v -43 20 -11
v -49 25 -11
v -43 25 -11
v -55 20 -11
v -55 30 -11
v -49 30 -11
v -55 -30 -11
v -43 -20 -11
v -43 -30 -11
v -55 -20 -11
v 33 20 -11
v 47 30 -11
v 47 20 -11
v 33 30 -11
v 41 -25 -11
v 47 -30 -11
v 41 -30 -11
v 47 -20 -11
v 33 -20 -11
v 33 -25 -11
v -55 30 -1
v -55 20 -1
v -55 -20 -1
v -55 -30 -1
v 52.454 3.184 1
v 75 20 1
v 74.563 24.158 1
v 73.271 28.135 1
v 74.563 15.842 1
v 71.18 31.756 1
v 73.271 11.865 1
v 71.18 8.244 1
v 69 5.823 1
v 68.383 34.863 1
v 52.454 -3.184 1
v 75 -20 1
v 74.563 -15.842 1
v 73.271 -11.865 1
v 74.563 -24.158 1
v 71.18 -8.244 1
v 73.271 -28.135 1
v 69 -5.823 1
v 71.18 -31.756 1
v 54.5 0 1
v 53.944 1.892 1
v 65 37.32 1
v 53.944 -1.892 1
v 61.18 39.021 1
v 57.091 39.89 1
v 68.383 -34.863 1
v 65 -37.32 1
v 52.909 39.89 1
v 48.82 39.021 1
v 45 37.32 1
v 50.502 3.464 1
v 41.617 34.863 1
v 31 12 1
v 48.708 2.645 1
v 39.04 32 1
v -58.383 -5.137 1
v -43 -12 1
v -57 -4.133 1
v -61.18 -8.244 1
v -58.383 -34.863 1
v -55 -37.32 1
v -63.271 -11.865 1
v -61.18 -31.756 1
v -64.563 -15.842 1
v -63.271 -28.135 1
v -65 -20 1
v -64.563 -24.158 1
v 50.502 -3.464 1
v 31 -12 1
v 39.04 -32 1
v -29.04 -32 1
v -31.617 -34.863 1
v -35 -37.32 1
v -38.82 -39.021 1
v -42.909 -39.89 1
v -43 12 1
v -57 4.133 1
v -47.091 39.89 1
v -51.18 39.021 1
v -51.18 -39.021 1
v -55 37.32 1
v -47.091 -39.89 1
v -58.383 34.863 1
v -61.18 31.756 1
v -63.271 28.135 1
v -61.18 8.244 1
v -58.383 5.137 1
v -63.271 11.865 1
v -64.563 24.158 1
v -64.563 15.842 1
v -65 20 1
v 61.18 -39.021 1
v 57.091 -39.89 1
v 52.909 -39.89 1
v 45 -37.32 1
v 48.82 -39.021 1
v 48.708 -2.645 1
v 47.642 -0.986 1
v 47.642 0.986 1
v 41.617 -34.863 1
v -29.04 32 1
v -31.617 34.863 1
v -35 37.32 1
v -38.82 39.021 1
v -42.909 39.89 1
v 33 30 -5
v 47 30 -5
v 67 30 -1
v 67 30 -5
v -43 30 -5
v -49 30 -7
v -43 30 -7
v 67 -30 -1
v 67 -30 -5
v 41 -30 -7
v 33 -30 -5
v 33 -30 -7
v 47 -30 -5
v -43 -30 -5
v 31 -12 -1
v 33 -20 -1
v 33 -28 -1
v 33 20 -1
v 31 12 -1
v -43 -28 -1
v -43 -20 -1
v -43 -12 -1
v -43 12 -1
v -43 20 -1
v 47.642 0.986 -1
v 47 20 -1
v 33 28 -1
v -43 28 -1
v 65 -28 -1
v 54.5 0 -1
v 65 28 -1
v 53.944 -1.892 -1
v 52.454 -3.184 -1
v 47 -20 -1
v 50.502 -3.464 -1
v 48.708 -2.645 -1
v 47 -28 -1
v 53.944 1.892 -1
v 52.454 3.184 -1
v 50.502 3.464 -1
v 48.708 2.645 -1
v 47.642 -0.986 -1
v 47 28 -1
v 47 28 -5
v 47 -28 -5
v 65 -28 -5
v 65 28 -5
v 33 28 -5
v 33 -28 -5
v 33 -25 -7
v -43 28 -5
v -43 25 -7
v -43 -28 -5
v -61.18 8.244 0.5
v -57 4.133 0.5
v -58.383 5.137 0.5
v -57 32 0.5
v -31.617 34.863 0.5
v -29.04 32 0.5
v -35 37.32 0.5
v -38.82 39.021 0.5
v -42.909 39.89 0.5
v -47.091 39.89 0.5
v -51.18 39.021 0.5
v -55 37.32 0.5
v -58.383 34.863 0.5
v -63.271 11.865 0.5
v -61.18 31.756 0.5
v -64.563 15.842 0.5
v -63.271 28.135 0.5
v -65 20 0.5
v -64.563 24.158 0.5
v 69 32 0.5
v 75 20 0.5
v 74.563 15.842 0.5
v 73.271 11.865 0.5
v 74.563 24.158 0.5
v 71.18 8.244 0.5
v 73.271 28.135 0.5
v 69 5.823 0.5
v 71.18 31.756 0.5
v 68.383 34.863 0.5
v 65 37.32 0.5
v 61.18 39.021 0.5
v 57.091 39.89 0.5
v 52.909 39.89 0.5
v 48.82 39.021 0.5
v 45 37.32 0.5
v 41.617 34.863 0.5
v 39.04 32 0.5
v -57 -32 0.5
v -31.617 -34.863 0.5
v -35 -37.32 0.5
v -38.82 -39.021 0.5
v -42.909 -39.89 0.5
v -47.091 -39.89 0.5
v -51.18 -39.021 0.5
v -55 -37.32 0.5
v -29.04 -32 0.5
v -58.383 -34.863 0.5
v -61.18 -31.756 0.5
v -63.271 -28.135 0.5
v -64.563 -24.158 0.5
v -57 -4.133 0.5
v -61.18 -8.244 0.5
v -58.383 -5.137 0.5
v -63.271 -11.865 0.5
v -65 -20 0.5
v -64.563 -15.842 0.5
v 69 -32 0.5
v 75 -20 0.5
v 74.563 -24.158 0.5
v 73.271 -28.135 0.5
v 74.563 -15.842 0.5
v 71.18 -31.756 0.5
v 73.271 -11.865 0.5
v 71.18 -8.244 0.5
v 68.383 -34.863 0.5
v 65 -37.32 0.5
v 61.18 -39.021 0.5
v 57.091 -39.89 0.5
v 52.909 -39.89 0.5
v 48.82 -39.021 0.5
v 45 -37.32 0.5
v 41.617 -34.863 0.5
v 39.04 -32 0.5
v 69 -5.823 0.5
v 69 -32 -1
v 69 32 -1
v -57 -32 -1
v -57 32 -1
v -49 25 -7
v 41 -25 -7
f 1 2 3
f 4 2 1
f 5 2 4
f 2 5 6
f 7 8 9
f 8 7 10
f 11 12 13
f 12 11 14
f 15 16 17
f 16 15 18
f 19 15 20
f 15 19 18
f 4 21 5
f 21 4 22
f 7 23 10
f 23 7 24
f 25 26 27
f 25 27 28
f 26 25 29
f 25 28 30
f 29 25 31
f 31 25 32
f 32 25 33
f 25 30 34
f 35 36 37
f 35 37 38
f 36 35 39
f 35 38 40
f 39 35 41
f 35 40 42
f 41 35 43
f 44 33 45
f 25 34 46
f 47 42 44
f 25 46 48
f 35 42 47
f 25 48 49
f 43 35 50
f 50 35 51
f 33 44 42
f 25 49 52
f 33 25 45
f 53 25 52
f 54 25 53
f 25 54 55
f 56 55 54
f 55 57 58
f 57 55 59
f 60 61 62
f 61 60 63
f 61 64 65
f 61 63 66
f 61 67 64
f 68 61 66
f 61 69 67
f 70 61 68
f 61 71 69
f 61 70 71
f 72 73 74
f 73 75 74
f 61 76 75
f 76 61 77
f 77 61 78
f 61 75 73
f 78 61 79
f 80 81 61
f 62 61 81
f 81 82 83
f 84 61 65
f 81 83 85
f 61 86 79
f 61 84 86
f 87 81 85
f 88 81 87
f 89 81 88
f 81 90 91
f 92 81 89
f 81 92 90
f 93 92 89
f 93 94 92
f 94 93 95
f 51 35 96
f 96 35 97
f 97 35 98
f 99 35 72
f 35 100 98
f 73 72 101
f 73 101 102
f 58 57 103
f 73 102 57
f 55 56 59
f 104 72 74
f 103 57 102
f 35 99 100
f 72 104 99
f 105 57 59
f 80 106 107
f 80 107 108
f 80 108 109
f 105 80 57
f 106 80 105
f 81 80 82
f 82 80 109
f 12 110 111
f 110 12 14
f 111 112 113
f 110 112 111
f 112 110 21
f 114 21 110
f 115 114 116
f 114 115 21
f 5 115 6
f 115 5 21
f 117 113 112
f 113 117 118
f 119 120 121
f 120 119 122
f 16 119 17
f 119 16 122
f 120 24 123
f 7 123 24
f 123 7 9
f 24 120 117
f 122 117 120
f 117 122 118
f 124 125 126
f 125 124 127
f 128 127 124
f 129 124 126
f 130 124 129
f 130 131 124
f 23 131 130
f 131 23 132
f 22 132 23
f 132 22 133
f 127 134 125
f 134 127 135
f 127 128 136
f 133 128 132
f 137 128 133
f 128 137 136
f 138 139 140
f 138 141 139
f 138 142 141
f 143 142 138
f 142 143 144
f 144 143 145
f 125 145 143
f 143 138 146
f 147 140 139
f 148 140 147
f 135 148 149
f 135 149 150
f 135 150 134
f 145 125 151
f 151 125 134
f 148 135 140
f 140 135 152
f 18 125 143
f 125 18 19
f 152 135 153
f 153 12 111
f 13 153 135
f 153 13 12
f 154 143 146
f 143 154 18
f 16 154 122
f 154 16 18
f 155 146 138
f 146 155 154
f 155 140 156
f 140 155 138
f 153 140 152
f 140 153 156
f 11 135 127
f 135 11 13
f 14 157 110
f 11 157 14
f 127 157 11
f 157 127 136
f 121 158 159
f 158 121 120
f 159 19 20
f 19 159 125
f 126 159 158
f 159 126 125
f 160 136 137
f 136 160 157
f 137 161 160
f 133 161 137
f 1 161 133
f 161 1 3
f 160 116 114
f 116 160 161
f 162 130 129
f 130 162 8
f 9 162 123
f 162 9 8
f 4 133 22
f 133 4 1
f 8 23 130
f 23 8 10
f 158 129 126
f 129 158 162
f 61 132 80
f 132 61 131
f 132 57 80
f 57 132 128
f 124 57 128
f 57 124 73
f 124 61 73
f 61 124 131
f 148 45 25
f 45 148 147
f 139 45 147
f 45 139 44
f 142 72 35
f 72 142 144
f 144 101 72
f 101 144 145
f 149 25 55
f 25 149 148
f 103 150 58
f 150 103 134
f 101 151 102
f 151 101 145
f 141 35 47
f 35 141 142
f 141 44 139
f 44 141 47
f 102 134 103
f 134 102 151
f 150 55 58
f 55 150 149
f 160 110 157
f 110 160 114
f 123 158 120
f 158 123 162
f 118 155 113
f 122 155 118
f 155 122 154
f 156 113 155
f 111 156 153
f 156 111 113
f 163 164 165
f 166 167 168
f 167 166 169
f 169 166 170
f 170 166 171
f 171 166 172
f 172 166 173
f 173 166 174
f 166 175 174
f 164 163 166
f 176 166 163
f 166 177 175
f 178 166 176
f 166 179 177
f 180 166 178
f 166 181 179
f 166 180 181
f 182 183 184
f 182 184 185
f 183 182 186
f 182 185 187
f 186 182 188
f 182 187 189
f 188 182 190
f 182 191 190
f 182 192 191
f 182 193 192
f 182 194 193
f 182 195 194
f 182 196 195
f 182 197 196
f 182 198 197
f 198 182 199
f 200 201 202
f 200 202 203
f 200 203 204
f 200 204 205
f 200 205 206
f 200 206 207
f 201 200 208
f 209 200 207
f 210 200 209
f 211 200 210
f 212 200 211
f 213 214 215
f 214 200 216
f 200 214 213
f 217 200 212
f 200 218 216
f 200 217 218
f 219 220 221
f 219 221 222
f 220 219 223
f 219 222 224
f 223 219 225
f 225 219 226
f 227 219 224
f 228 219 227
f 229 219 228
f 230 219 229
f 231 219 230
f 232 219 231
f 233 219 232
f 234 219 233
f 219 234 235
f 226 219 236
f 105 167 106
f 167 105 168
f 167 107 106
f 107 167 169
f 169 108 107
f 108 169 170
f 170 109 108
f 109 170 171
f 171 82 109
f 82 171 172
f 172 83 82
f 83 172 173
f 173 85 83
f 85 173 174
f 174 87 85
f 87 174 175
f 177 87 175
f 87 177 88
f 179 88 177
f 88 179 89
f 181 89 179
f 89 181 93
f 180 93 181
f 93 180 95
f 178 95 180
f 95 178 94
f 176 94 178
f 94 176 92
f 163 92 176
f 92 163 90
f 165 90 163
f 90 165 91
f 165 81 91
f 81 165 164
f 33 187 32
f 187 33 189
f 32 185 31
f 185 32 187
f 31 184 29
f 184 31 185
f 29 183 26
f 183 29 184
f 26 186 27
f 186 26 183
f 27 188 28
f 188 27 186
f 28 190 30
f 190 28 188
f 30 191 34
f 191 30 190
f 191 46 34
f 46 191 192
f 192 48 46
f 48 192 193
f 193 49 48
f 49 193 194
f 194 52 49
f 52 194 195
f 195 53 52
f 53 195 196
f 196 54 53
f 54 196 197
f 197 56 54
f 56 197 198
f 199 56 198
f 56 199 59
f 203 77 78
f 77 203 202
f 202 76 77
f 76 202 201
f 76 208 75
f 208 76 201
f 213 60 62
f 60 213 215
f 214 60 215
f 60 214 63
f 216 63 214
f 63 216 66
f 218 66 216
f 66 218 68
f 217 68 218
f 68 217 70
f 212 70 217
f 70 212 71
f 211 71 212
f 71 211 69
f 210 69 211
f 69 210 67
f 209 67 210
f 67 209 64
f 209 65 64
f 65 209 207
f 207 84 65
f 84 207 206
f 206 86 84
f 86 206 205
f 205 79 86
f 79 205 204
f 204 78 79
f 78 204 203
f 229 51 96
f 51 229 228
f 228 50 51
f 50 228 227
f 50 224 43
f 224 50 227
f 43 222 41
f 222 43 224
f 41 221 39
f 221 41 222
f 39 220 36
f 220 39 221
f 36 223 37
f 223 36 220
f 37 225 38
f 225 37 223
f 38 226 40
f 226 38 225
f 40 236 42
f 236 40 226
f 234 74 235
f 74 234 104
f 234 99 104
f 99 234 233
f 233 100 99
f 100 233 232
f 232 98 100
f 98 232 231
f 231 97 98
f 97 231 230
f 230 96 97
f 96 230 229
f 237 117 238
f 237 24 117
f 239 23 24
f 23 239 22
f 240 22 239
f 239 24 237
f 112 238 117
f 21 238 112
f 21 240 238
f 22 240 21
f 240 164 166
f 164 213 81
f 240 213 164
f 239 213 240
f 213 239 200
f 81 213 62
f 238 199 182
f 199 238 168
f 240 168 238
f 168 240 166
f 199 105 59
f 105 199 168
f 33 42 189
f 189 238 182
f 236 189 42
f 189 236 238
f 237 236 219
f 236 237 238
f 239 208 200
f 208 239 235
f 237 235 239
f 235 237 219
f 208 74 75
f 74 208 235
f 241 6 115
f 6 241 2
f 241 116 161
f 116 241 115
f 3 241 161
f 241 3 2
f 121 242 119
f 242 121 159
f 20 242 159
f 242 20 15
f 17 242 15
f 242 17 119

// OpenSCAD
//color("red")

difference(){
union(){

translate([-55, -30, -15])

difference()
{
difference()
{
difference(){
translate([0, 0, 4])
linear_extrude(12)
square ([122, 60]);
    

translate([2, 10, -1])
linear_extrude(15){
translate([0, 0, 0])
square ([110, 40]);
translate([100, -8, -1])
square ([18, 56]);
translate([10, 8, -1])
square ([76, 40]);
translate([10, -8, -1])
square ([76, 40]);

}
}
translate([12, 18, 0])
linear_extrude(20)
square ([74, 24]);
translate([106, 30,  0])
linear_extrude(20)
circle(d=7);


}


translate([12, -1, -2])
linear_extrude(12)
square ([76, 62]);
translate([-5, 10, -2])
linear_extrude(16)
square ([76, 40]);
translate([102, -1, -2])
linear_extrude(12)
square ([40, 76]);


}
difference(){
translate([-45,20,.5])
linear_extrude(.5){
circle(20);
translate([100,0,0])
circle(20);
translate([0,-40,0])  
 circle(20);
translate([100,-40,0])
circle(20);   

}

translate([-55, -30, -2])
linear_extrude(12)
square ([122, 60]);



}

translate([-55, -30, -2])
difference(){
    

translate([-2, -2, 1])
linear_extrude(2)
square ([126, 64]);

translate([0, 0, -5])
linear_extrude(20)
square ([122, 60]);
}
}


union(){
translate([-55, -21, -2])
translate([6, 46, -15])
linear_extrude(10)
square ([10, 10]);
translate([25, -71, -2])
translate([6, 36, -15])
linear_extrude(10)
square ([10, 10]);
}
}


/*
difference(){
translate([-2, -2, -25])
linear_extrude(25)
square ([126, 64]);

translate([0, 0, -23])
linear_extrude(25)
square ([122, 60]);

}
translate([0, 0, -23])
linear_extrude(9)
square ([12, 8]);

translate([89, 0, -23])
linear_extrude(9)
square ([12, 8]);

translate([0, 52, -23])
linear_extrude(9)
square ([8, 8]);

translate([89, 52, -23])
linear_extrude(9)
square ([12, 8]);
*/
